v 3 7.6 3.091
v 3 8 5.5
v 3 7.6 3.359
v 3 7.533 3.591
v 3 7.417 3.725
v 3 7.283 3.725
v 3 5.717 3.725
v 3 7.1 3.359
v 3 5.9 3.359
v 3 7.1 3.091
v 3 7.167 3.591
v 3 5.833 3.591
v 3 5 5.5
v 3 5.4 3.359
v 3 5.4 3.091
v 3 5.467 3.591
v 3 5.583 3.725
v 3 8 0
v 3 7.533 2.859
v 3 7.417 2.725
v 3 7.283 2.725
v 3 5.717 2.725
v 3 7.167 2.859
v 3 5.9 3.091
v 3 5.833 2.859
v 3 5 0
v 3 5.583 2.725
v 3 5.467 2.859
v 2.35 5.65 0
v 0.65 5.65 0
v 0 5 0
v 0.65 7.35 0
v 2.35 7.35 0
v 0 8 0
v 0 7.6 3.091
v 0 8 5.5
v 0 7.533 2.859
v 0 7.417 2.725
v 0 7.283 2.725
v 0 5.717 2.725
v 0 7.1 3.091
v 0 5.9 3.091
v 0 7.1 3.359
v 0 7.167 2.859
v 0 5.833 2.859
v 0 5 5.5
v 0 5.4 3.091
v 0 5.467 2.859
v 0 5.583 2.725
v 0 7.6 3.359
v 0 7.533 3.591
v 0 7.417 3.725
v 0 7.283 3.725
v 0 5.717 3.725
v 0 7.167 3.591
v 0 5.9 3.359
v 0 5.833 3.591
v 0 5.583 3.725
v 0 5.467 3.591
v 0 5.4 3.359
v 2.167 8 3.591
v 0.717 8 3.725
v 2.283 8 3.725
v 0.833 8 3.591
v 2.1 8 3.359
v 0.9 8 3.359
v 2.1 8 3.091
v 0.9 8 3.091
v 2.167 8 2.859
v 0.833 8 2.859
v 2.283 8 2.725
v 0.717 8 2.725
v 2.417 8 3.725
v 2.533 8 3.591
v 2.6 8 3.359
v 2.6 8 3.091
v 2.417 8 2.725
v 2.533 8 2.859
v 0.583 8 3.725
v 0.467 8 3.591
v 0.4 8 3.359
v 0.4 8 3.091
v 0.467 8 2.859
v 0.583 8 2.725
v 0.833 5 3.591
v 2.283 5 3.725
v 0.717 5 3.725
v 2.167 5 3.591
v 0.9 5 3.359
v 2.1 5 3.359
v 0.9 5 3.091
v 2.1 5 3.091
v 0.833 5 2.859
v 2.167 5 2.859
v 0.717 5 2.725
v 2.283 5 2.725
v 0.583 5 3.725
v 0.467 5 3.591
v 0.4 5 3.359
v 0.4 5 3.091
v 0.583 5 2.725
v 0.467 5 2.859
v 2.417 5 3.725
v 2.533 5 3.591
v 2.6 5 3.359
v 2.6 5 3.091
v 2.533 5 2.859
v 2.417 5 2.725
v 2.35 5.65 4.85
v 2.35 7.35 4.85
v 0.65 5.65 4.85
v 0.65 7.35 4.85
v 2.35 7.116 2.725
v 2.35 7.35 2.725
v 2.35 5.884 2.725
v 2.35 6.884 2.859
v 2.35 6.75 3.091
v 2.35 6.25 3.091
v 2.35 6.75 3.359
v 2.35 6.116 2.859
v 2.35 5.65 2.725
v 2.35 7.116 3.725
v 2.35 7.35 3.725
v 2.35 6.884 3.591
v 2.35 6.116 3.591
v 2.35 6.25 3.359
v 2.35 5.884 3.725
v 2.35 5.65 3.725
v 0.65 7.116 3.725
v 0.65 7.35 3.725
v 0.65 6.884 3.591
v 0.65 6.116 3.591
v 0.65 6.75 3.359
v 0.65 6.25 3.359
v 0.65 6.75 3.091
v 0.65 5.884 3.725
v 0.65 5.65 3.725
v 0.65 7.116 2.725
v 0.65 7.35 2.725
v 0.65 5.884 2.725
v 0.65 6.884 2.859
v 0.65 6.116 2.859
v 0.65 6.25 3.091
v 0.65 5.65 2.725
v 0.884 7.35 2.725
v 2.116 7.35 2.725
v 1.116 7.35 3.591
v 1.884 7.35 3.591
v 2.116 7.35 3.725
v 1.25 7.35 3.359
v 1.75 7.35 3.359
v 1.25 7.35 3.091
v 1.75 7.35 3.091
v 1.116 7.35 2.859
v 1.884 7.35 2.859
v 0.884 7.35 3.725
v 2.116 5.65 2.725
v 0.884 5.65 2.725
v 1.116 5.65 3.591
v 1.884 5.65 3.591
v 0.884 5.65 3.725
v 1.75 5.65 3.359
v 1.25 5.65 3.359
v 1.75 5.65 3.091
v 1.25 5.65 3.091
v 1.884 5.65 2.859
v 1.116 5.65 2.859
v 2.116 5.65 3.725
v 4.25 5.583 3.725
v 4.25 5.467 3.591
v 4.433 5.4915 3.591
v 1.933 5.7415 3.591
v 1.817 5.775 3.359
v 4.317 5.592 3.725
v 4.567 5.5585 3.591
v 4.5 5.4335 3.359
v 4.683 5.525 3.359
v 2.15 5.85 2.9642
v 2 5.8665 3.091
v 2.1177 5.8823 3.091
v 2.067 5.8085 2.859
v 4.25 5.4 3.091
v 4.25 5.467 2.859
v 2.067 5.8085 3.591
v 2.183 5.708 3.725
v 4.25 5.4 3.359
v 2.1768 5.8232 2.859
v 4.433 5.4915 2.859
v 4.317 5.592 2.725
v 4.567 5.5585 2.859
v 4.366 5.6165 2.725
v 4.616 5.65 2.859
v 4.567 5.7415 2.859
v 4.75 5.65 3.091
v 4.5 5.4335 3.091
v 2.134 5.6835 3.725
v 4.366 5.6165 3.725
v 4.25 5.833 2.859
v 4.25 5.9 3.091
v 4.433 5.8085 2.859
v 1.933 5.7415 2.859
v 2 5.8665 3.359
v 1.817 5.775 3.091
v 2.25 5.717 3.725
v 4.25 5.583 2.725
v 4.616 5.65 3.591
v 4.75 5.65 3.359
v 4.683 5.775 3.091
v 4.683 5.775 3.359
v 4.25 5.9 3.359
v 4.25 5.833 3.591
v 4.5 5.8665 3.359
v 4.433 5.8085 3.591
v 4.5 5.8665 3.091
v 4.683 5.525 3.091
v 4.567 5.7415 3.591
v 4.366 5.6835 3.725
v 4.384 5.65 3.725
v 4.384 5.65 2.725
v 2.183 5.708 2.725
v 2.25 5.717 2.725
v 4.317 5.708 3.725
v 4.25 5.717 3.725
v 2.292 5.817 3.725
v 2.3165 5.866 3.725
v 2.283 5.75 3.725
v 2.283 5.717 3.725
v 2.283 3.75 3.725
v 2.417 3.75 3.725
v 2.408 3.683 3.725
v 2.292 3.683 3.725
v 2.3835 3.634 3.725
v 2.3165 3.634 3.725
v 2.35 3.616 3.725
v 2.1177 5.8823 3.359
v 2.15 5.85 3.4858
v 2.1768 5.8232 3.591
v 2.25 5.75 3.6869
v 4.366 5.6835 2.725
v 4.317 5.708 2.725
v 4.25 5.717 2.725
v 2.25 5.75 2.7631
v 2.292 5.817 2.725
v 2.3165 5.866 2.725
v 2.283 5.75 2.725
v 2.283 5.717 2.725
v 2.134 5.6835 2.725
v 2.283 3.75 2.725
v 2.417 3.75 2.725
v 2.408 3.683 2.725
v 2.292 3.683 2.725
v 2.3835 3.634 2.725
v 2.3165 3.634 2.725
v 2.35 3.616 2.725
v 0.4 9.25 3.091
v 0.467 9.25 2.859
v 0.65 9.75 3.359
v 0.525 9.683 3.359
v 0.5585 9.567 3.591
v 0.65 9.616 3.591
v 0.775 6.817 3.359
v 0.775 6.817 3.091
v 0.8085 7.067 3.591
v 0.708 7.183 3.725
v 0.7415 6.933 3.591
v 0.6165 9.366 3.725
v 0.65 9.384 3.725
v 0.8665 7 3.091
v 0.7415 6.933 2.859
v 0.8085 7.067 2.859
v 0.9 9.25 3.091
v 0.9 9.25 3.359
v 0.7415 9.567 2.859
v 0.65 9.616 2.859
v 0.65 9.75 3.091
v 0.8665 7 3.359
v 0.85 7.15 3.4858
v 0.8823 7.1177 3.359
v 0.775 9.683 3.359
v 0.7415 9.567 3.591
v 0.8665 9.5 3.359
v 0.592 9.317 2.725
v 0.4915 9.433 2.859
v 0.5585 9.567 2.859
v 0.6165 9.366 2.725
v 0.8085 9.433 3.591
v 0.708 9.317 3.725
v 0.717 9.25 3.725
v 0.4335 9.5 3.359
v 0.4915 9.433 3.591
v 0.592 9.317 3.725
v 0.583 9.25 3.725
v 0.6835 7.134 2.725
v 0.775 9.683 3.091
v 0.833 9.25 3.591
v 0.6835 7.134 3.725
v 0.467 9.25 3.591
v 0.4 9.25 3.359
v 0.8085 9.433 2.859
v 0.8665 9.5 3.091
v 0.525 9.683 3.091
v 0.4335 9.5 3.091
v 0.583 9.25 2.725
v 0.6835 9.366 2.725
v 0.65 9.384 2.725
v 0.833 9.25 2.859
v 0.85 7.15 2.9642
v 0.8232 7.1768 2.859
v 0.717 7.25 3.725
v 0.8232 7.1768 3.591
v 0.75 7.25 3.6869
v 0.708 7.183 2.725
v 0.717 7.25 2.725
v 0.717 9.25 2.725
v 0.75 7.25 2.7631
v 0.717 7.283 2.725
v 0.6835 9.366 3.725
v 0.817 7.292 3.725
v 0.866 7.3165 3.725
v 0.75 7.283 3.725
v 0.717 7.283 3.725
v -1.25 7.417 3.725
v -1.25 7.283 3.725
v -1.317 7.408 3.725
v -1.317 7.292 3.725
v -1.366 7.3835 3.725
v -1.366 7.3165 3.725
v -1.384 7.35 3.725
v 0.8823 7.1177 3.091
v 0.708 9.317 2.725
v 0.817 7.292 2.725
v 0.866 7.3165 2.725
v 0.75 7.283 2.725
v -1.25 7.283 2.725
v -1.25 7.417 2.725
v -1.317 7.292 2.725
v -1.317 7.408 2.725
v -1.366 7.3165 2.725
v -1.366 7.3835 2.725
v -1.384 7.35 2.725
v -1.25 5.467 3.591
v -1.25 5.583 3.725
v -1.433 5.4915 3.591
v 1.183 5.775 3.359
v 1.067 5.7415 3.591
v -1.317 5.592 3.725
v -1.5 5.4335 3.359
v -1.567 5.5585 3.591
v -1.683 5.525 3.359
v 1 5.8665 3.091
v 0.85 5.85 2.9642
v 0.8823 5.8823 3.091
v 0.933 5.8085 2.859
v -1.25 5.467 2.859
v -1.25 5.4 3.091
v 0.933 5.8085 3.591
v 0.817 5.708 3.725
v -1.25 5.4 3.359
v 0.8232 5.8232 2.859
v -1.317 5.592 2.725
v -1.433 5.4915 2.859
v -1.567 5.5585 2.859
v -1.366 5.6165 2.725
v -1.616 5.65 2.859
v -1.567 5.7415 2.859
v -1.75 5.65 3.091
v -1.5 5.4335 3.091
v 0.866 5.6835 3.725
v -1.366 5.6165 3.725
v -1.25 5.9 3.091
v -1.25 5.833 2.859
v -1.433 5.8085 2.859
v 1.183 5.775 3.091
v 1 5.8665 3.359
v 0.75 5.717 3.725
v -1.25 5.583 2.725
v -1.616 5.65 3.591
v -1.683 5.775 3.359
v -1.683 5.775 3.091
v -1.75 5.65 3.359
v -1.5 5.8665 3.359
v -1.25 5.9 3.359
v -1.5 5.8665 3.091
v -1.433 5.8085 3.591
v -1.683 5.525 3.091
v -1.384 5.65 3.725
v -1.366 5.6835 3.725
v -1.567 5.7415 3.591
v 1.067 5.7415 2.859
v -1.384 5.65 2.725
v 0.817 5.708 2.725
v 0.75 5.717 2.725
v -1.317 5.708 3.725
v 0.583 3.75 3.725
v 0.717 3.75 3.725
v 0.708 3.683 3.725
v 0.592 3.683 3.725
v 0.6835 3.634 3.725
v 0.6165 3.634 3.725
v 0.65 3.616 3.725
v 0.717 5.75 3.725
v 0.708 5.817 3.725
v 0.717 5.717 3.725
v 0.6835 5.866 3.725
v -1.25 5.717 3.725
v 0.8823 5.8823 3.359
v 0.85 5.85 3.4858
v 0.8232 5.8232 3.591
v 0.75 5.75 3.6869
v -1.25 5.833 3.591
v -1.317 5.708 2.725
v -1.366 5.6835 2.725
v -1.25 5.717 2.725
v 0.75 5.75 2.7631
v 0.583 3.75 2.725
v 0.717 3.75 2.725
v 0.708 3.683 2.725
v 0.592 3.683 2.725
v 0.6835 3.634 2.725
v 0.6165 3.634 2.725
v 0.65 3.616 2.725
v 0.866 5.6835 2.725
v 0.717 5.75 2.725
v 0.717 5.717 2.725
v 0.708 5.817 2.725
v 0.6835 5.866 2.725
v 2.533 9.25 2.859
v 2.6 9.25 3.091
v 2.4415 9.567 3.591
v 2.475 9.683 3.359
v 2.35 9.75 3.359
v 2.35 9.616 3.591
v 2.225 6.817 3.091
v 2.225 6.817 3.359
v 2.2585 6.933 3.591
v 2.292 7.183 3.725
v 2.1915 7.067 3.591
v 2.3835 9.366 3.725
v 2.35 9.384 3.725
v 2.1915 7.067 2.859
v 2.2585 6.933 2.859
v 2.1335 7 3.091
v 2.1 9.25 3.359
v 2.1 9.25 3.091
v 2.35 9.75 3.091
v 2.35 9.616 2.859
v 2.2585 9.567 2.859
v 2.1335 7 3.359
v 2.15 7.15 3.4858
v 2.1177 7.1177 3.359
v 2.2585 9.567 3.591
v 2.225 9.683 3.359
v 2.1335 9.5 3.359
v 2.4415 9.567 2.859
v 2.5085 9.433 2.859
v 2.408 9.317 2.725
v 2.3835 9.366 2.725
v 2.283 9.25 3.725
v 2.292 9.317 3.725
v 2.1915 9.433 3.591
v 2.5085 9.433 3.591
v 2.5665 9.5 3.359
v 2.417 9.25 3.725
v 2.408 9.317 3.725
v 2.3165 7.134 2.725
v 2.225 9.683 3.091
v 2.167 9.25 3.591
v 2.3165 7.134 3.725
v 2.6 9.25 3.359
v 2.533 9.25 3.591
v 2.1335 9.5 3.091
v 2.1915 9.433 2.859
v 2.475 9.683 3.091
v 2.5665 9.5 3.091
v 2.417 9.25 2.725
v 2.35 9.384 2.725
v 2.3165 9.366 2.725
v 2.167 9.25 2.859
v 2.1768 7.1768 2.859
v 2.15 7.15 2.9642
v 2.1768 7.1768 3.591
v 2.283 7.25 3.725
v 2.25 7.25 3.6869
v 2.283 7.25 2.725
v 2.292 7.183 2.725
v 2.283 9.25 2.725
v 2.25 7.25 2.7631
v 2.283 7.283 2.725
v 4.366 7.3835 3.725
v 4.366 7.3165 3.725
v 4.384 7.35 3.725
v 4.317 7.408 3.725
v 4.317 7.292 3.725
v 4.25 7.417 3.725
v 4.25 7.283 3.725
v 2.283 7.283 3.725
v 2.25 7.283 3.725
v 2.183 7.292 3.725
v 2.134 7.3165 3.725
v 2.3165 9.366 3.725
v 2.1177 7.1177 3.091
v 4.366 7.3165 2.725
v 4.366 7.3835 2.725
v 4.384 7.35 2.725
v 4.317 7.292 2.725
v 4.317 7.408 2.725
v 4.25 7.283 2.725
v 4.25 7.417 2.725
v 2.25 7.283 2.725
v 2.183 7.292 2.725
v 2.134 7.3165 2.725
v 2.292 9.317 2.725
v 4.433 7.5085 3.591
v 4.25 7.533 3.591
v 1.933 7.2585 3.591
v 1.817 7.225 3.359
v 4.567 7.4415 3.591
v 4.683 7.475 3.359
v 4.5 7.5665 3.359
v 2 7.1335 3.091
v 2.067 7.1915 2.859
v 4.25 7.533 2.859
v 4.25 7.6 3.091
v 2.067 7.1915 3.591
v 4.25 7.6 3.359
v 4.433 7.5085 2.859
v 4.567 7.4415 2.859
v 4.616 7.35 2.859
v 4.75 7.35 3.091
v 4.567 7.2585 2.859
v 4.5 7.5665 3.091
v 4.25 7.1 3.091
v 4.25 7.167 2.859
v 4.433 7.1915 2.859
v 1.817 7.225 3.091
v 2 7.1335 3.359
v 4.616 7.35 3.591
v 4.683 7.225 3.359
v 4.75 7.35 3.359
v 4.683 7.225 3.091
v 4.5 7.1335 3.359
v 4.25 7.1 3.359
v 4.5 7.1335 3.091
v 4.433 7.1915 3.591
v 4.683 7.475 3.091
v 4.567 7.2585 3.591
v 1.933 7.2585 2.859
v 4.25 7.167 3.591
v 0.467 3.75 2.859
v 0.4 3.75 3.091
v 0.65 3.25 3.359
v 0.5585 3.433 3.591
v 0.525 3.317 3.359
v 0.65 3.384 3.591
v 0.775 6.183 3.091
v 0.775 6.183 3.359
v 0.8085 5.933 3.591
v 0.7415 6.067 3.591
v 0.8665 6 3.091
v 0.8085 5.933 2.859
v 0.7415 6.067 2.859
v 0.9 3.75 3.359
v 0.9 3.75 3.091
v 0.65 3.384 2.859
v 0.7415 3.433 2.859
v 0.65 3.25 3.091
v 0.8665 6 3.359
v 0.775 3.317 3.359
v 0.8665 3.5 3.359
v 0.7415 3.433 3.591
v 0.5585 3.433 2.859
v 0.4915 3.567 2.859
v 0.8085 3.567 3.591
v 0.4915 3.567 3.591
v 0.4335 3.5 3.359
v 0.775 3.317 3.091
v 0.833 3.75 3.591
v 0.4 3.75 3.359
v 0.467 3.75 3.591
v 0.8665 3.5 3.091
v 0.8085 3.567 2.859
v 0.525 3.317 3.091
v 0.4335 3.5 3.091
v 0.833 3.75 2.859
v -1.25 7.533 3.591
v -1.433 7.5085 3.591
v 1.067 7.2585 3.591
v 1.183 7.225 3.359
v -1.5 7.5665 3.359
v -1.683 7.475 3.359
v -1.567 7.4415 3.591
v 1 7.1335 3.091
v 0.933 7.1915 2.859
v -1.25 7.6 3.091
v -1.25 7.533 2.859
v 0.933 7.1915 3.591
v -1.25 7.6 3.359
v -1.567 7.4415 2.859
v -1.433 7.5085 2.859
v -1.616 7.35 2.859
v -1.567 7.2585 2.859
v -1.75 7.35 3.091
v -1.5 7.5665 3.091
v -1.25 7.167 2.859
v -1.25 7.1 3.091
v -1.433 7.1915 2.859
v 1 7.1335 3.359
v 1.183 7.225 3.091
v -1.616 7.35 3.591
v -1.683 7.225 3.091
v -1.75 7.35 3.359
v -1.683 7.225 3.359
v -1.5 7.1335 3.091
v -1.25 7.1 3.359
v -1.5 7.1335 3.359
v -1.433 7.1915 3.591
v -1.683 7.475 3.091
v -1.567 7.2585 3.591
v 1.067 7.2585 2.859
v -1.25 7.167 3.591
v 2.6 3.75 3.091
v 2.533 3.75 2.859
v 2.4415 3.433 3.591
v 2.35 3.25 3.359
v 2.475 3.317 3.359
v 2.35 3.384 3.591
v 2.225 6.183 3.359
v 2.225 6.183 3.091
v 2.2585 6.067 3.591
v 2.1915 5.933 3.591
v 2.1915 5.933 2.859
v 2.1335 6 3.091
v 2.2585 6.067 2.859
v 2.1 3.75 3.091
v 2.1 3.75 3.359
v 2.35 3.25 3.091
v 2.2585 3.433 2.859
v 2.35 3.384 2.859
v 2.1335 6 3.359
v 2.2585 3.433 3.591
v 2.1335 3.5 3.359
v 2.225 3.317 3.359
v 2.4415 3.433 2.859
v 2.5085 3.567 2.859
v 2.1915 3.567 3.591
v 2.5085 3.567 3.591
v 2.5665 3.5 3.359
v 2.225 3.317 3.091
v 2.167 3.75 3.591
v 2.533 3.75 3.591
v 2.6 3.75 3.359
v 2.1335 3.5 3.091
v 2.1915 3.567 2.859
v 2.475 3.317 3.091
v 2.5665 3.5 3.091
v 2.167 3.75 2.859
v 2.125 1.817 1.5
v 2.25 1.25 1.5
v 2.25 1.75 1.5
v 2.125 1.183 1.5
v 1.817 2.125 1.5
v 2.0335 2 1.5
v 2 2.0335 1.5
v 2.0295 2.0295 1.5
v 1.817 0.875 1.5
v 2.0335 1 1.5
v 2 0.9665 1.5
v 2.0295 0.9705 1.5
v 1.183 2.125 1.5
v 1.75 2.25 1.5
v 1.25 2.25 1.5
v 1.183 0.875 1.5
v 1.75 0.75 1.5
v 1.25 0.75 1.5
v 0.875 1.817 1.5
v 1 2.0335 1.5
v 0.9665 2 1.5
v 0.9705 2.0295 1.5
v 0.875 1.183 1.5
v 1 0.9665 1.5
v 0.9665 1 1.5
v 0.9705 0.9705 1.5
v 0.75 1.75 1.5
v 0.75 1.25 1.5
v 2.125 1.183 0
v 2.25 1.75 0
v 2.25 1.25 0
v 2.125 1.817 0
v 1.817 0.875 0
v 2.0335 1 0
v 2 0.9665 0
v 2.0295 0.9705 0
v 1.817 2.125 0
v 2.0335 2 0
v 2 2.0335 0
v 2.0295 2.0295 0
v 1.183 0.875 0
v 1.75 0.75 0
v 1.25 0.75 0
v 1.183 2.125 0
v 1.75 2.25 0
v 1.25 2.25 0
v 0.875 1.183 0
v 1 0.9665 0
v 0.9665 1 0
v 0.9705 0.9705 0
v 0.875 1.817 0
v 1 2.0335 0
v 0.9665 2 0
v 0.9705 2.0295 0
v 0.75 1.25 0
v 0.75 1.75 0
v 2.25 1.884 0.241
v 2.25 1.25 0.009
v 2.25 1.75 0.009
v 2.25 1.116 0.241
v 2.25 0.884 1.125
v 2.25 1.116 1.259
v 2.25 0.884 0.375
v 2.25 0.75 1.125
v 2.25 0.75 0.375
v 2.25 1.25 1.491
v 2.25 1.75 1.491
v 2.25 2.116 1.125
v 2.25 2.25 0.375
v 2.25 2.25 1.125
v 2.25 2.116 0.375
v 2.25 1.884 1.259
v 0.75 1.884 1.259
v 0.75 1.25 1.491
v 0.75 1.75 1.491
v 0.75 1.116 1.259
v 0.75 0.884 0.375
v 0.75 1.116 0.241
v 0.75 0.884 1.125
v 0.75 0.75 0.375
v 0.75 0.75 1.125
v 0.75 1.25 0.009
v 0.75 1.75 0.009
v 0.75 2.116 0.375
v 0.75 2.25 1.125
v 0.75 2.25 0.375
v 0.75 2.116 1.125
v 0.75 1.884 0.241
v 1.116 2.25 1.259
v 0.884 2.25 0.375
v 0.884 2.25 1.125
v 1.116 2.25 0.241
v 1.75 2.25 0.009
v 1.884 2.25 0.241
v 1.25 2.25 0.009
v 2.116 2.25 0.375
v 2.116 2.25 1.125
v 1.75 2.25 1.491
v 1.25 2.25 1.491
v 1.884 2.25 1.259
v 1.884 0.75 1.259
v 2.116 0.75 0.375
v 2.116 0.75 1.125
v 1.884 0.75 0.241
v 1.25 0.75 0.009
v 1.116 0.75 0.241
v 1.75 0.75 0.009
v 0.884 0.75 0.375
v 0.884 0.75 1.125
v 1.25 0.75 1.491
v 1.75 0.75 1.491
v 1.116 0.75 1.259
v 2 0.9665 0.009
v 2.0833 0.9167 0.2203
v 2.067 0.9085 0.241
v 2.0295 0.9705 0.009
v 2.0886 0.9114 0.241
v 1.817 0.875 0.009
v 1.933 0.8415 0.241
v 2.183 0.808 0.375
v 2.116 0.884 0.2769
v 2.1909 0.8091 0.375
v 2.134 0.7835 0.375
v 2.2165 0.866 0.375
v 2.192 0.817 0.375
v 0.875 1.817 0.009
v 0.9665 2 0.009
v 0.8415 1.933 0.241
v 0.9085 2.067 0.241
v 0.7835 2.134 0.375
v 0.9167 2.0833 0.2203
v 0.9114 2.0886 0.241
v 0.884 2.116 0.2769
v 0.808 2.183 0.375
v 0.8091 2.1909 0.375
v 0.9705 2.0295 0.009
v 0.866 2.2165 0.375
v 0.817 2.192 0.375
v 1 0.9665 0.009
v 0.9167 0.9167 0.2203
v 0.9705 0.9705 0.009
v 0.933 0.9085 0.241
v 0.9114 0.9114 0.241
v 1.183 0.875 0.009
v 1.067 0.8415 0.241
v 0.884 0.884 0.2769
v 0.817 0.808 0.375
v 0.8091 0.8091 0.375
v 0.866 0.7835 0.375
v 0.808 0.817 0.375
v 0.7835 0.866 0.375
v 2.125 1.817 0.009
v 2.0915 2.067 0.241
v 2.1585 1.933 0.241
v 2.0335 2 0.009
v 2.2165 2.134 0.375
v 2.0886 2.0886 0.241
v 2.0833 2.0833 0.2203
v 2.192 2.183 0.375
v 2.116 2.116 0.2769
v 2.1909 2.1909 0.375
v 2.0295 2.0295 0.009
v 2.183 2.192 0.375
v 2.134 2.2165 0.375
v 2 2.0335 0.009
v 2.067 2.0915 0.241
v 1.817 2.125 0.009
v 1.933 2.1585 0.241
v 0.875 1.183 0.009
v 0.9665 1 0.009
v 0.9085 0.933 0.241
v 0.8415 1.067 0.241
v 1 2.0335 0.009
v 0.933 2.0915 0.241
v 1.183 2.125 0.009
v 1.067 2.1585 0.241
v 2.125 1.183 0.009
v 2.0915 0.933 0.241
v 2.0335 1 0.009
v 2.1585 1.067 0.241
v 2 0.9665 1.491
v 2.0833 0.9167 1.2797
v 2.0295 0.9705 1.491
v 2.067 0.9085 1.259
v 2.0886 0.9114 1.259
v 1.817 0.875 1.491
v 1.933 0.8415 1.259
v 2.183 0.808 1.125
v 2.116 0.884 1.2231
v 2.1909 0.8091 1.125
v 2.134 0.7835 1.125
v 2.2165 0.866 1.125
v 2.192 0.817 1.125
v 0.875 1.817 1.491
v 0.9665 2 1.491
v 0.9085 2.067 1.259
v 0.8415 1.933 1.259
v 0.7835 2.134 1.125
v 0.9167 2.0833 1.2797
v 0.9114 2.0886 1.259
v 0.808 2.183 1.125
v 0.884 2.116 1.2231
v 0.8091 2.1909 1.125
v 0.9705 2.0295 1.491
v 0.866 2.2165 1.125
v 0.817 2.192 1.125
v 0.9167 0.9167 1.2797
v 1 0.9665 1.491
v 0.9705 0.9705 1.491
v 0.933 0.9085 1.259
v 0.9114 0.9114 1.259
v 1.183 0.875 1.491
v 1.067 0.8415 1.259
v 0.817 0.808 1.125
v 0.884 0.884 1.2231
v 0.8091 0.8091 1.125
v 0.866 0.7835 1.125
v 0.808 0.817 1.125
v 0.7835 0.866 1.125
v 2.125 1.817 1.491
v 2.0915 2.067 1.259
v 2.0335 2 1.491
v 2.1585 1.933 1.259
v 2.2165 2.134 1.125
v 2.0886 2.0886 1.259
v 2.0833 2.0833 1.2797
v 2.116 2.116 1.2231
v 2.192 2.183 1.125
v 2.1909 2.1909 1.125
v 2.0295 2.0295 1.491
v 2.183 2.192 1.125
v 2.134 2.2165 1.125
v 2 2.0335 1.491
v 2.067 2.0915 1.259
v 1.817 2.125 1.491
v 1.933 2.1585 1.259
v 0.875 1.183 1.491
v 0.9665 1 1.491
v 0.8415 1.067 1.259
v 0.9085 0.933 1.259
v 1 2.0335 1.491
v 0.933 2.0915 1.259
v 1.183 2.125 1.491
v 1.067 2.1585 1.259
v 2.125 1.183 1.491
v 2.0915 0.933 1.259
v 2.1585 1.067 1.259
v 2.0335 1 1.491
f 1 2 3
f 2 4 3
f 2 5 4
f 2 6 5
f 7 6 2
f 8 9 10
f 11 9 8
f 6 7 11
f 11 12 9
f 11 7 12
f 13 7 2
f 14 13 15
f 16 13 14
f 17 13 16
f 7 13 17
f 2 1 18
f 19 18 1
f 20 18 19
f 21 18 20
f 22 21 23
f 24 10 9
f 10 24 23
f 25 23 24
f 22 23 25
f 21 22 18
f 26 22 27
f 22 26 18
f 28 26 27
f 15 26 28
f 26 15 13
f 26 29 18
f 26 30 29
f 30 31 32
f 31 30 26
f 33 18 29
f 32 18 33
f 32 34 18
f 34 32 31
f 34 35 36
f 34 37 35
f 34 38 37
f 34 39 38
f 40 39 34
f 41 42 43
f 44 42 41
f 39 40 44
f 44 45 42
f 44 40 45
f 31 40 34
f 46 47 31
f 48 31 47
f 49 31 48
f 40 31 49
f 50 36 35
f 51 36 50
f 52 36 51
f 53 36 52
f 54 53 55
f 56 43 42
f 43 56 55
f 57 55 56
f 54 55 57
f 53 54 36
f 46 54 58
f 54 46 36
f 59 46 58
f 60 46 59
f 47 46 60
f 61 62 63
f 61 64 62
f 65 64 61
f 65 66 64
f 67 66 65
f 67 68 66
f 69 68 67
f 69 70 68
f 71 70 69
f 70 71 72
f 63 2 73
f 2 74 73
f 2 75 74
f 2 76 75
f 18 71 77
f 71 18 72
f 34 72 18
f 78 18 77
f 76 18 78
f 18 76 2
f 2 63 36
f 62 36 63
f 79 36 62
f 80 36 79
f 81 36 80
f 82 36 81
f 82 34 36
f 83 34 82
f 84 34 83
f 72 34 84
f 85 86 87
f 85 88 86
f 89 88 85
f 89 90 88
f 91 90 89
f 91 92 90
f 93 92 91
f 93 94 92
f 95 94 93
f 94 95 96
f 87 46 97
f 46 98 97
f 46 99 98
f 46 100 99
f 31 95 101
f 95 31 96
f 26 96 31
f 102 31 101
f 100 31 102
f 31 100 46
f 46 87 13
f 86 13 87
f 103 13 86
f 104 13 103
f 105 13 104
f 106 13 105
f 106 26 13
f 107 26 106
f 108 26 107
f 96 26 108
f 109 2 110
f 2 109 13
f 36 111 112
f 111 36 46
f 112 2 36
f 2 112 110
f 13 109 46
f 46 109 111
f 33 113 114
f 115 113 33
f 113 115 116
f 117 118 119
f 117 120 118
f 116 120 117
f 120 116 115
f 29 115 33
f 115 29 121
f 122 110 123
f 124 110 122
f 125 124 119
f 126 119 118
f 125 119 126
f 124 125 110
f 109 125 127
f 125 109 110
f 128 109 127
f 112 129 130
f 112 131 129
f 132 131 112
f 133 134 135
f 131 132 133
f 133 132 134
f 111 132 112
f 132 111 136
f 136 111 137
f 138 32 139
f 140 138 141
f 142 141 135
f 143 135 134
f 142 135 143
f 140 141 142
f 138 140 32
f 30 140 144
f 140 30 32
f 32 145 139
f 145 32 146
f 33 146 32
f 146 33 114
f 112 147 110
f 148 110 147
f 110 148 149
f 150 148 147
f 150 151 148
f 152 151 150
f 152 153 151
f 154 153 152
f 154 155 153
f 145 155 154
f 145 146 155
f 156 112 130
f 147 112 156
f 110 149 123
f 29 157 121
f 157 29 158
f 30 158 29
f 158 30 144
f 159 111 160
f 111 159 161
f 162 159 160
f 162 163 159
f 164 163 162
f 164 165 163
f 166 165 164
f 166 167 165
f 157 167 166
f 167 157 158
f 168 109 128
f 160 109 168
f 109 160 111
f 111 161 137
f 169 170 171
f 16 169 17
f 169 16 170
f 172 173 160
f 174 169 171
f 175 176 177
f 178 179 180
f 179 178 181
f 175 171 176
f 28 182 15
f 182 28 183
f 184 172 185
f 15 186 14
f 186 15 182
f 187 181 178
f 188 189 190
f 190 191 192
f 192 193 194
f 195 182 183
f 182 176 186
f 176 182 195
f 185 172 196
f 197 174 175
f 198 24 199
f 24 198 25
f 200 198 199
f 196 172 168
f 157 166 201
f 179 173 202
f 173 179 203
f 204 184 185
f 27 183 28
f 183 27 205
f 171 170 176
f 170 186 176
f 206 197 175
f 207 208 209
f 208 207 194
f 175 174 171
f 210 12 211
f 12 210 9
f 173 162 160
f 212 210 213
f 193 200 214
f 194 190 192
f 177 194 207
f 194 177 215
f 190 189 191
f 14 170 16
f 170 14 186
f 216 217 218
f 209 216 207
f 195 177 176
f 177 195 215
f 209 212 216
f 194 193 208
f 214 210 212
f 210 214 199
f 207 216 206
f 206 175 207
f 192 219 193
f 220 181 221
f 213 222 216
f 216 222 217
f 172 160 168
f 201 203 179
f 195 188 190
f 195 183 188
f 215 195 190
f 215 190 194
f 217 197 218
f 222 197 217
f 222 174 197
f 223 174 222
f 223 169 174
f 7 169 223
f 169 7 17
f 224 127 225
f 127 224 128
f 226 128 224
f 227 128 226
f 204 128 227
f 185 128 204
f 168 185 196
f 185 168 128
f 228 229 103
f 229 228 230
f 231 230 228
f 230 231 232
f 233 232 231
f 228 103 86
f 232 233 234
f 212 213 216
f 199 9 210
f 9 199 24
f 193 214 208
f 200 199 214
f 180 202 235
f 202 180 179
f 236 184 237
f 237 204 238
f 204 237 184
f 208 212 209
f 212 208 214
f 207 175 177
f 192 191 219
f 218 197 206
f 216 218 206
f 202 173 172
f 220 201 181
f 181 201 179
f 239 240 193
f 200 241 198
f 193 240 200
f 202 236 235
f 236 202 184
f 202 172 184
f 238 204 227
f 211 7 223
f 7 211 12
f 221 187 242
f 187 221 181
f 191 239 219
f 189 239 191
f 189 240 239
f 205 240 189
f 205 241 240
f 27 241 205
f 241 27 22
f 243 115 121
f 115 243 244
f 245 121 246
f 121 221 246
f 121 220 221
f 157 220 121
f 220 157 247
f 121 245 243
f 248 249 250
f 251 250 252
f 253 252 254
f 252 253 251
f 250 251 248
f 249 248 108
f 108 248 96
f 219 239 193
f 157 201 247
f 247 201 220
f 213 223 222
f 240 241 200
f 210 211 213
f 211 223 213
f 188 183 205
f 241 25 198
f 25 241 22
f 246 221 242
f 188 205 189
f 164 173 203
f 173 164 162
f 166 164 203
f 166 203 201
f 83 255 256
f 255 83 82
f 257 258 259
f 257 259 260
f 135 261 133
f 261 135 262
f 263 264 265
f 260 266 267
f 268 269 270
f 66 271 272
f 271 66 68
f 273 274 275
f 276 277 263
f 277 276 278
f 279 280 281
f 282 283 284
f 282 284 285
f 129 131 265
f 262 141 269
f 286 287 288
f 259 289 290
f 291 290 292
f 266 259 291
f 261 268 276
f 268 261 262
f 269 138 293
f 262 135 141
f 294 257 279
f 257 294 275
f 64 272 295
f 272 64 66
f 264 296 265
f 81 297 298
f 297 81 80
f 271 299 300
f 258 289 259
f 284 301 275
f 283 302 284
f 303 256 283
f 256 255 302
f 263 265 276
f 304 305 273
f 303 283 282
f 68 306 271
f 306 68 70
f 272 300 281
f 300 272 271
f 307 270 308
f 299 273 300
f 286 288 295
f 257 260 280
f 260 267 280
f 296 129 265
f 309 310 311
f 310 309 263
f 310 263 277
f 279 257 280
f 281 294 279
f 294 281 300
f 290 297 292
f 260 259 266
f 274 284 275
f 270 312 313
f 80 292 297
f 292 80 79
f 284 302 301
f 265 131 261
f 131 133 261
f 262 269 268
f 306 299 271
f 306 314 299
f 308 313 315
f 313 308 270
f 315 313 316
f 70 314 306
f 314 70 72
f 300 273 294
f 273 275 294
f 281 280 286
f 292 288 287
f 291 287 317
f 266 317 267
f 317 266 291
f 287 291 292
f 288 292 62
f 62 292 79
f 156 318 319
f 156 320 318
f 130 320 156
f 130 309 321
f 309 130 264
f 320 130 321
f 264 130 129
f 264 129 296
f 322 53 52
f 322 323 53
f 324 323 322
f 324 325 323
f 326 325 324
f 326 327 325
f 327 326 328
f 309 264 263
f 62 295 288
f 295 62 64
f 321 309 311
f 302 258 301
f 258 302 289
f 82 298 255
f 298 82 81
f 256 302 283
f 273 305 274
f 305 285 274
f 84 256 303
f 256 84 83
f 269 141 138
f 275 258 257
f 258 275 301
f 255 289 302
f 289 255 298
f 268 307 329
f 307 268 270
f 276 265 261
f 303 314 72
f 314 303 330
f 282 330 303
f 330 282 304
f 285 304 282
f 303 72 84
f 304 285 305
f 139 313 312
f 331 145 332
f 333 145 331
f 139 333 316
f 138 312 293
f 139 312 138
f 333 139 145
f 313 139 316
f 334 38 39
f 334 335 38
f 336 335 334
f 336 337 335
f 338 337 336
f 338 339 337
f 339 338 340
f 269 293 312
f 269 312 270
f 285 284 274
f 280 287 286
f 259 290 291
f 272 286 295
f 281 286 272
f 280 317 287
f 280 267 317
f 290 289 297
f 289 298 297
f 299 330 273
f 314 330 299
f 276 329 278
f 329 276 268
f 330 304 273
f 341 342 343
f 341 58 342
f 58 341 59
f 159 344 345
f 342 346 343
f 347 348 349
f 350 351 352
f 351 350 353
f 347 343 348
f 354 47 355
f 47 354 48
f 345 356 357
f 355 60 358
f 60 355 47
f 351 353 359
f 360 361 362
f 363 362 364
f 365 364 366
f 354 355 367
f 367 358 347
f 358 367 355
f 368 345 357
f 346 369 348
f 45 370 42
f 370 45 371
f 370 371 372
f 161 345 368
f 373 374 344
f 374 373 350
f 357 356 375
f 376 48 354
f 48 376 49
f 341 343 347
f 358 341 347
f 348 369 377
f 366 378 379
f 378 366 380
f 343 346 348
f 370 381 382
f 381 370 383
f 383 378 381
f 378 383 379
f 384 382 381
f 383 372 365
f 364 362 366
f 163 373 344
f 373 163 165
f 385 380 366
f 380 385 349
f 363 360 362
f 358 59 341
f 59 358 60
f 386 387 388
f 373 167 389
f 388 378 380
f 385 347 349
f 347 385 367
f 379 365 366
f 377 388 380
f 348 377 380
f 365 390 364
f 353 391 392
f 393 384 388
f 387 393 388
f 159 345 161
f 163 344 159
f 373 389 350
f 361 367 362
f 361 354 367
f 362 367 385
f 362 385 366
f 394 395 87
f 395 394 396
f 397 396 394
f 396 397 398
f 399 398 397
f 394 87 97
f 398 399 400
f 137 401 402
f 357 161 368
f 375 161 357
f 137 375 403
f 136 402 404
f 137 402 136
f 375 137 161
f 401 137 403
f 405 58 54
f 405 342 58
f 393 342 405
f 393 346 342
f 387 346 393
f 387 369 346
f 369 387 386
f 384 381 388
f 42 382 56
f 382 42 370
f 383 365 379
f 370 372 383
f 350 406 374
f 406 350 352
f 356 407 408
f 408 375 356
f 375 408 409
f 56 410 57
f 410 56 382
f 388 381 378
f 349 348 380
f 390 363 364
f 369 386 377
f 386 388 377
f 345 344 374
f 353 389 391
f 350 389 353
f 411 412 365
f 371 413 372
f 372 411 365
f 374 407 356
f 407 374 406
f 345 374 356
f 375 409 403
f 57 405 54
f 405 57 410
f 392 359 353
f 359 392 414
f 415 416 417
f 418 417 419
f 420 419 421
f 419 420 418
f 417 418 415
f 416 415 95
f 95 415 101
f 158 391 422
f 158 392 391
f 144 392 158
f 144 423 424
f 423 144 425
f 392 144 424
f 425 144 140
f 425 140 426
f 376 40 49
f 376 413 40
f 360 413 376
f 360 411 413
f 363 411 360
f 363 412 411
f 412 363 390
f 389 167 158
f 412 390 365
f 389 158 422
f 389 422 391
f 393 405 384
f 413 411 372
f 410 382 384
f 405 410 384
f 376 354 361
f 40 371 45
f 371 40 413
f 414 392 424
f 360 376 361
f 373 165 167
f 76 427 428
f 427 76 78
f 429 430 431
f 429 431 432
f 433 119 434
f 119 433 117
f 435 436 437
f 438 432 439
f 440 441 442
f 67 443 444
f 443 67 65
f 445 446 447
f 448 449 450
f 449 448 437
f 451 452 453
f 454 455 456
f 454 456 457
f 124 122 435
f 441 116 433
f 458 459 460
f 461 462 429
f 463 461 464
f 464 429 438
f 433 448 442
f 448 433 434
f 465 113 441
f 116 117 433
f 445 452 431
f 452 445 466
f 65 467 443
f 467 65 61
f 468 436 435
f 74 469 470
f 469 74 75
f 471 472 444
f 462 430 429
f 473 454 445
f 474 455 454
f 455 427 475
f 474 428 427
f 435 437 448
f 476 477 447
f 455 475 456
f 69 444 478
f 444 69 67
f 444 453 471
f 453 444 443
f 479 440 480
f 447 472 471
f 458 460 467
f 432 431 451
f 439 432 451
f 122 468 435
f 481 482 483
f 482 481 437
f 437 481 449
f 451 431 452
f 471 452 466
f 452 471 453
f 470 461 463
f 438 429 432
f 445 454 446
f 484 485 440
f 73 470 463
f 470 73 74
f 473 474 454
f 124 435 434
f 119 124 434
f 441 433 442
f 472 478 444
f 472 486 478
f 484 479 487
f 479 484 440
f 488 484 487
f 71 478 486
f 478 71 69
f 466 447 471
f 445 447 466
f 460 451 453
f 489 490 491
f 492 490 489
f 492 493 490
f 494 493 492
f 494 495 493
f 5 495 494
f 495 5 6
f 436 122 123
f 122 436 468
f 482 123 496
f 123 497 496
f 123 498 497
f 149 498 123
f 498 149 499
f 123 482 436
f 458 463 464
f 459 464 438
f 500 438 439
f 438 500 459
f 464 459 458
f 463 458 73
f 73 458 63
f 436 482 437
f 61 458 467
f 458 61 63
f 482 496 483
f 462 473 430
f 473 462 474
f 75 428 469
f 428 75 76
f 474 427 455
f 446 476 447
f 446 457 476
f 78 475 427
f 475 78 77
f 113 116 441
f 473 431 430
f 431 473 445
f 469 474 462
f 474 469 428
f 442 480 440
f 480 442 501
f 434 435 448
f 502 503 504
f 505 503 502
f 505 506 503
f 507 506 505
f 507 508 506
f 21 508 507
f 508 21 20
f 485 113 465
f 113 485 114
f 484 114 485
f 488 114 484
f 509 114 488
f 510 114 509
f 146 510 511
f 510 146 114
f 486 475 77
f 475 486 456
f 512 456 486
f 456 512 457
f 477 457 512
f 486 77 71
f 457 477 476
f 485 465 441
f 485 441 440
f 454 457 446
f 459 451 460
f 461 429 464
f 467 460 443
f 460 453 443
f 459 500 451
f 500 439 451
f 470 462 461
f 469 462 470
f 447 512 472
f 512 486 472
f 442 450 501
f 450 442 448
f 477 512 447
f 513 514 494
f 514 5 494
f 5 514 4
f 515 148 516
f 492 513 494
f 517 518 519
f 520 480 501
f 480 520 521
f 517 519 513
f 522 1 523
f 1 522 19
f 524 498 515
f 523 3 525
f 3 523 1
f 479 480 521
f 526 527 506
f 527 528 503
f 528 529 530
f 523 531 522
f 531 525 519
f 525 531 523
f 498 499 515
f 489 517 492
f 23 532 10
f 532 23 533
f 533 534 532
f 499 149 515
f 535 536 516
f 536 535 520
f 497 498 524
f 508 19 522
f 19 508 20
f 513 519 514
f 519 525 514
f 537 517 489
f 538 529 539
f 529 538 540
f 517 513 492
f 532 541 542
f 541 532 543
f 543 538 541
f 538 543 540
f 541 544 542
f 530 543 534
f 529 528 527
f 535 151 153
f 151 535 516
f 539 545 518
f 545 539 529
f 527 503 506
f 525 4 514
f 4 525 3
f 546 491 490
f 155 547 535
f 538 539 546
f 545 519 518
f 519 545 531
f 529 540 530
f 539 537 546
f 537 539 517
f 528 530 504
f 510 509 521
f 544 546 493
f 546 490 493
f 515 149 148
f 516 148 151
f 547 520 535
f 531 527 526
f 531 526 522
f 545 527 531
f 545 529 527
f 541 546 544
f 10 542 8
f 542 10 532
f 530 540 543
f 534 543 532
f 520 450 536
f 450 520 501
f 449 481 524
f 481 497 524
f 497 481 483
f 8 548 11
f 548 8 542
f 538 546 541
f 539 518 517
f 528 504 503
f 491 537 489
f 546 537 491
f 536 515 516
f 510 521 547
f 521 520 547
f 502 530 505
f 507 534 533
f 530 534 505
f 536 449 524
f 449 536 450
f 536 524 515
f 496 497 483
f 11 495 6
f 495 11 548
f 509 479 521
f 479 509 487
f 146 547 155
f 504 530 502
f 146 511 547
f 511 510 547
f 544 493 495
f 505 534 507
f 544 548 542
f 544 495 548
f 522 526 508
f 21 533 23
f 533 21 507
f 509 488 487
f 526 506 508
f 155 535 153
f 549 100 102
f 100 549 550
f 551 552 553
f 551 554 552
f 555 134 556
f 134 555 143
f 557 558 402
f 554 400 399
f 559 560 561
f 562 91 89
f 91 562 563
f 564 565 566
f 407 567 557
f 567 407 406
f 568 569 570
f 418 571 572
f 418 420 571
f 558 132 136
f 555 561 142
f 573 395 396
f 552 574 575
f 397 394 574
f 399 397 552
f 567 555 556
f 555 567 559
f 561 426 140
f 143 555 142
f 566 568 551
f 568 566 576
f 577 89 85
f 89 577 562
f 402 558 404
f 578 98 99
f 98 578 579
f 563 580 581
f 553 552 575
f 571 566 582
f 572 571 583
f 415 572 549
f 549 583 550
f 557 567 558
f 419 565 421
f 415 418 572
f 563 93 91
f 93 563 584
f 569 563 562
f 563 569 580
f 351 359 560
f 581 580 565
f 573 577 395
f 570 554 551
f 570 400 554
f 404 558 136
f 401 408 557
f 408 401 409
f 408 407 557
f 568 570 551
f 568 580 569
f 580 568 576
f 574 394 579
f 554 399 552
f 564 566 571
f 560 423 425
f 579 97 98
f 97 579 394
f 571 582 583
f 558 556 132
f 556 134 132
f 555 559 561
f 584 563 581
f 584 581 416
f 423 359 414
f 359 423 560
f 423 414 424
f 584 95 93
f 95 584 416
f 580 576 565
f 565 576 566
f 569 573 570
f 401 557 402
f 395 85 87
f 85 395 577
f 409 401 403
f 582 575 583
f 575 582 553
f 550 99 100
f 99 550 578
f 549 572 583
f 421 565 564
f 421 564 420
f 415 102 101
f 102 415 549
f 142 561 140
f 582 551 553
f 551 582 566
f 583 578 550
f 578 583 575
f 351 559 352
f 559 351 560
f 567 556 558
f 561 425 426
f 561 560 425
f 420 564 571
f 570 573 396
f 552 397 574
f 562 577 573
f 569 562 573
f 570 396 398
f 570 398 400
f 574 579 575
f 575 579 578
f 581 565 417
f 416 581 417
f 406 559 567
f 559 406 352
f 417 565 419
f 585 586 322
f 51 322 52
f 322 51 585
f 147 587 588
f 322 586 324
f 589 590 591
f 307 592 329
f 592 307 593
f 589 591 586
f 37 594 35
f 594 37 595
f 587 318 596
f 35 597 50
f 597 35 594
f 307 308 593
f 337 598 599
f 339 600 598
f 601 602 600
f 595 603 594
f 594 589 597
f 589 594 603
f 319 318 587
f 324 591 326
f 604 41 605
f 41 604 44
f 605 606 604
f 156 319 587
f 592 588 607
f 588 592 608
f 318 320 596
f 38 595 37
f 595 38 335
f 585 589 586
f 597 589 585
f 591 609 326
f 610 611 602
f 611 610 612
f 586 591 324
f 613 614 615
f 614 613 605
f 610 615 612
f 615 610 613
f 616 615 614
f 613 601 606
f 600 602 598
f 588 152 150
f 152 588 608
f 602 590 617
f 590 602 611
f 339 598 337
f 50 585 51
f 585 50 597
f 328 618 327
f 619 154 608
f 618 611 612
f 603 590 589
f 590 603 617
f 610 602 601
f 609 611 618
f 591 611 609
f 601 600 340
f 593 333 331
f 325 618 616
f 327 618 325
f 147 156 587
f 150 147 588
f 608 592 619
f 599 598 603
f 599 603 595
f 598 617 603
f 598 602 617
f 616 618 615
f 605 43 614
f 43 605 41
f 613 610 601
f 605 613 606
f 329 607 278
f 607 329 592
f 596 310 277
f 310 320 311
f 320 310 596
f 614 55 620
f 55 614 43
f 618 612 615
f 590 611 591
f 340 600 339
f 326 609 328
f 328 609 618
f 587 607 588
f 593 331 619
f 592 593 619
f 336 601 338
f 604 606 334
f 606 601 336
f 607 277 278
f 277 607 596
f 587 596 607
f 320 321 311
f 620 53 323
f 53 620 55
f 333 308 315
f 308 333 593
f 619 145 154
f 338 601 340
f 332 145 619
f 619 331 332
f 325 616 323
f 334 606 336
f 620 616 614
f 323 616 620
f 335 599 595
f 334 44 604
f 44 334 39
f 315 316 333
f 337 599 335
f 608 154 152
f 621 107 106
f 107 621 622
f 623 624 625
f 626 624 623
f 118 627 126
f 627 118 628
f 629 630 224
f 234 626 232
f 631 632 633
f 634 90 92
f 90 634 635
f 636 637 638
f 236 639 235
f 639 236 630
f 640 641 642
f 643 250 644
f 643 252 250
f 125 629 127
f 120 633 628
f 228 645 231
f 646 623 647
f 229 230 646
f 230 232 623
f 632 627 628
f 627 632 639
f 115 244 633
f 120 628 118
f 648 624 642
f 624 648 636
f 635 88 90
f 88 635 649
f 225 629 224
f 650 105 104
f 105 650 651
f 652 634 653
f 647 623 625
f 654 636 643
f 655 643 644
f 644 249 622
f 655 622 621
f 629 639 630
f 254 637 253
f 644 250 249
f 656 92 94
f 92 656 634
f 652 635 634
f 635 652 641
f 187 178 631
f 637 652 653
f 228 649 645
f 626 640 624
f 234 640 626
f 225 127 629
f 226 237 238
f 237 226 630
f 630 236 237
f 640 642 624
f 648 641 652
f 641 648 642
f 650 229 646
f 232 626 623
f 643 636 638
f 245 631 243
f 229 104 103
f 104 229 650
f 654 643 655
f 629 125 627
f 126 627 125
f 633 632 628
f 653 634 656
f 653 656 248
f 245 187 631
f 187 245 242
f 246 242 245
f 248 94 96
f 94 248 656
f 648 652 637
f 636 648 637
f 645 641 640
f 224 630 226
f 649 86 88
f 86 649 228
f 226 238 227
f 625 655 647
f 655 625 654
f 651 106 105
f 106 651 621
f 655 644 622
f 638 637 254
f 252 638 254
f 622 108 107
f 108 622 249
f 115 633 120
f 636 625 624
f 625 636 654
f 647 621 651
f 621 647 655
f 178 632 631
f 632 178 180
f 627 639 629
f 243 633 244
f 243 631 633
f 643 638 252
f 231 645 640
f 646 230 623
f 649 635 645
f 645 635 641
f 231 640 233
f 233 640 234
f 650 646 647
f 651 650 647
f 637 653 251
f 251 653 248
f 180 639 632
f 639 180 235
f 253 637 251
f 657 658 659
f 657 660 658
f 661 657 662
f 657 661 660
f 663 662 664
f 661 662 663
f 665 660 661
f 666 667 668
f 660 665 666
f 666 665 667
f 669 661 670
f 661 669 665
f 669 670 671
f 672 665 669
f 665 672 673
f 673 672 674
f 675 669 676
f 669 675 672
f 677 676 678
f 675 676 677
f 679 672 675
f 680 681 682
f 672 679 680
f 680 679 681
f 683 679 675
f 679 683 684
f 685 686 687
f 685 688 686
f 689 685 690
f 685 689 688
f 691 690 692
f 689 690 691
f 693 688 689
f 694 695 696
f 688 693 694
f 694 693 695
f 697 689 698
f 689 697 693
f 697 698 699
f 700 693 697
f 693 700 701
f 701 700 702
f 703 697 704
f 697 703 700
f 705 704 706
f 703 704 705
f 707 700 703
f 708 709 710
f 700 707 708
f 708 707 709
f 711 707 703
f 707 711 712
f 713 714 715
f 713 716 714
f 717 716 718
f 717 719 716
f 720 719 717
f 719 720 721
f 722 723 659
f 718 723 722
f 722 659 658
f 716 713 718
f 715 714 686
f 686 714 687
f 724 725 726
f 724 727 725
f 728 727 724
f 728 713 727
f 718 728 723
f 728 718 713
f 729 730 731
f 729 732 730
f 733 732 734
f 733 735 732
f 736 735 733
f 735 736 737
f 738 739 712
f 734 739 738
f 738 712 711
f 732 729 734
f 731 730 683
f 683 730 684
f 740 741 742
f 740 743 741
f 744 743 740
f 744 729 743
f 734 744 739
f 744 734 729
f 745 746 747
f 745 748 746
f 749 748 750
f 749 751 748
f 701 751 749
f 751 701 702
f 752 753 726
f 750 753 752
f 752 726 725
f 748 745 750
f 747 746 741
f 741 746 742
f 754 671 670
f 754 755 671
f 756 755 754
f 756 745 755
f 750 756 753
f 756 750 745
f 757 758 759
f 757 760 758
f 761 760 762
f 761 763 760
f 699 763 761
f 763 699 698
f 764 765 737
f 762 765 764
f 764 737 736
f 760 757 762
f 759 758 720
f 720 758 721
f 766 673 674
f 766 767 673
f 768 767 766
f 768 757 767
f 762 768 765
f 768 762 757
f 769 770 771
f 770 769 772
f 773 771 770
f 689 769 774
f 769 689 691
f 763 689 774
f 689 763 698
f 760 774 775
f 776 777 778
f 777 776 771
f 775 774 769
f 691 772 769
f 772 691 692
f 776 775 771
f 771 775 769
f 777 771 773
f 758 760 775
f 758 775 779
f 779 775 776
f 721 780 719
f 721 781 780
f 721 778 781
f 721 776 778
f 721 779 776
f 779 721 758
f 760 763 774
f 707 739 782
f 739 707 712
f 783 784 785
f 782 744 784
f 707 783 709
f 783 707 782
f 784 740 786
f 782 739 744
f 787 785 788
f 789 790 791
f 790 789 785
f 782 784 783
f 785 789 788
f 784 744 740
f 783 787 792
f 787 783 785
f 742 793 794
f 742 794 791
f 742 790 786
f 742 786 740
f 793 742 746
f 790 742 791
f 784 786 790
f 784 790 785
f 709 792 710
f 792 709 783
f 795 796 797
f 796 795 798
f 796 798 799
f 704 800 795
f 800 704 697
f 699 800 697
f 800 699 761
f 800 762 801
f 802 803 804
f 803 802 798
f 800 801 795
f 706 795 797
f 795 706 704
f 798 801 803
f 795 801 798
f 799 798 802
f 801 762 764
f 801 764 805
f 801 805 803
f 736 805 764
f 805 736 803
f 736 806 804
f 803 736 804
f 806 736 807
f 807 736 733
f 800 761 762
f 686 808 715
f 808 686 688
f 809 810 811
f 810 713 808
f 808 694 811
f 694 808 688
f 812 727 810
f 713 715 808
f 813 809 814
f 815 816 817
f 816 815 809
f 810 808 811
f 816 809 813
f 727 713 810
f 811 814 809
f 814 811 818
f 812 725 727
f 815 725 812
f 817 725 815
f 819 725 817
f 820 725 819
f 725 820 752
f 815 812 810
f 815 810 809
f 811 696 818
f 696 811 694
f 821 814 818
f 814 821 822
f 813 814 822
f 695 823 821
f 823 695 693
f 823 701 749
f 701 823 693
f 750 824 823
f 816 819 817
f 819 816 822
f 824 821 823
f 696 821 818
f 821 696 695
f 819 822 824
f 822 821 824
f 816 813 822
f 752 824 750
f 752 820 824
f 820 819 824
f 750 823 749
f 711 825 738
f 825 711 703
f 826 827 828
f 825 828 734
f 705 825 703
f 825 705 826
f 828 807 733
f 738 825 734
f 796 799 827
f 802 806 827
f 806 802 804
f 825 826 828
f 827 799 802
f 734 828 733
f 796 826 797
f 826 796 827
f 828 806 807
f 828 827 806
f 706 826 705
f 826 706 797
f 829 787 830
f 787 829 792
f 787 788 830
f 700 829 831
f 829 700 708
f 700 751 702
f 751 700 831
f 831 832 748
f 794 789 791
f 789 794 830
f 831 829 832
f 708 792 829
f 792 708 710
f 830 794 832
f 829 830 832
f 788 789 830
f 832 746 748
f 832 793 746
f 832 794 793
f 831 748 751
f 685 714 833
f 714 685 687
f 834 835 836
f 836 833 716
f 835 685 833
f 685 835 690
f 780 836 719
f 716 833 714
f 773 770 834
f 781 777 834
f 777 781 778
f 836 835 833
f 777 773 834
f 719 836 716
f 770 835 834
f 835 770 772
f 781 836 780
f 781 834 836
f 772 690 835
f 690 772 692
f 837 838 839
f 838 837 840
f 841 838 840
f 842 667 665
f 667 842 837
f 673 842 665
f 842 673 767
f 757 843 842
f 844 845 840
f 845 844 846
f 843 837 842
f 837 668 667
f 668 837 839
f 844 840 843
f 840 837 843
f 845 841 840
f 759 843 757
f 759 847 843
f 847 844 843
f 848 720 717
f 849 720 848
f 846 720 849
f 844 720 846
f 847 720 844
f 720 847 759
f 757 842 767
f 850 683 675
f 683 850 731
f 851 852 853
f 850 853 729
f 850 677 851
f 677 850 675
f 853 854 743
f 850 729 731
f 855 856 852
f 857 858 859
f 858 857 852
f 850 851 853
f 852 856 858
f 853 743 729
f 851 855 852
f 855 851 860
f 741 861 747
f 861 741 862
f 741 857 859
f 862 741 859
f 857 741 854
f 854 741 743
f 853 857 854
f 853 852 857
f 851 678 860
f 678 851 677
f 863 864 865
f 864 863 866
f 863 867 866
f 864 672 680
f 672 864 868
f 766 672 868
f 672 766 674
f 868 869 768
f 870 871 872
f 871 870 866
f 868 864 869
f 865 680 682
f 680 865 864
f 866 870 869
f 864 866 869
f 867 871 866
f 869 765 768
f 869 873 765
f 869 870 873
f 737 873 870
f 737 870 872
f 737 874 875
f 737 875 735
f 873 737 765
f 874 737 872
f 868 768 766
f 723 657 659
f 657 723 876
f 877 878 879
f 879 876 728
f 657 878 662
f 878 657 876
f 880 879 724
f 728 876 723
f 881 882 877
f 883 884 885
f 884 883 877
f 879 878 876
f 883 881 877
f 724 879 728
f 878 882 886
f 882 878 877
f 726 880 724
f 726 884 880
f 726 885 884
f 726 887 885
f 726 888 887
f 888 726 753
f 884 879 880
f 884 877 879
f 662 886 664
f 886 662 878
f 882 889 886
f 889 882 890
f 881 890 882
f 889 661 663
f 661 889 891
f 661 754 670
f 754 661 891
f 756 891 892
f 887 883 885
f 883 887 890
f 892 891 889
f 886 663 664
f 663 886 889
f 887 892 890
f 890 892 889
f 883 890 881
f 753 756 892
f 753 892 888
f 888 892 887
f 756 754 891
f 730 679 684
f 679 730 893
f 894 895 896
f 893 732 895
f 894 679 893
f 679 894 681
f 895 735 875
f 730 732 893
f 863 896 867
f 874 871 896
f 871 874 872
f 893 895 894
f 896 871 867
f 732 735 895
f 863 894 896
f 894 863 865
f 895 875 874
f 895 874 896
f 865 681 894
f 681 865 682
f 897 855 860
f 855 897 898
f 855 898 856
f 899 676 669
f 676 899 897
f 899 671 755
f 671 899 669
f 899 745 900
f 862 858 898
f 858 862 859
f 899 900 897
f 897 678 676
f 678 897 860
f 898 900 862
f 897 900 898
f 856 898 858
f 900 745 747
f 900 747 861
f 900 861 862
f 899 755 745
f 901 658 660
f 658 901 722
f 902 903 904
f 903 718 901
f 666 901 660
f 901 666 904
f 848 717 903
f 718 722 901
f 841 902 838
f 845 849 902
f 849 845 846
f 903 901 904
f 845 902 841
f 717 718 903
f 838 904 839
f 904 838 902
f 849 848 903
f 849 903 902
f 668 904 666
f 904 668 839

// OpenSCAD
// BGSD
include <../lib/boardgame_insert_toolkit_lib.4.scad>;
data = [
    // Source STL: Tokens B.stl
    // STL bbox min [-66, -36, 0] max [-14, 119, 28] size [52, 155, 28]
    // Detected compartments: 4; wall thickness: 1.5mm
    [ OBJECT_BOX,
        [ NAME, "Tokens B" ],
        [ BOX_SIZE_XYZ, [52, 155, 28] ],
        [ BOX_WALL_THICKNESS, 1.5 ],
        [ BOX_NO_LID_B, true ],
        [ BOX_FEATURE,
            [ NAME, "Tokens B cavity 1" ],
            [ FTR_COMPARTMENT_SIZE_XYZ, [49, 48, 26.5] ],
            [ FTR_NUM_COMPARTMENTS_XY, [1, 1] ],
            [ FTR_SHAPE, SQUARE ],
            [ POSITION_XY, [0, 0] ],
        ],
        [ BOX_FEATURE,
            [ NAME, "Tokens B cavity 2" ],
            [ FTR_COMPARTMENT_SIZE_XYZ, [49, 48, 26.5] ],
            [ FTR_NUM_COMPARTMENTS_XY, [1, 1] ],
            [ FTR_SHAPE, SQUARE ],
            [ POSITION_XY, [0, 49.5] ],
        ],
        [ BOX_FEATURE,
            [ NAME, "Tokens B cavity 3" ],
            [ FTR_COMPARTMENT_SIZE_XYZ, [49, 42, 26.5] ],
            [ FTR_NUM_COMPARTMENTS_XY, [1, 1] ],
            [ FTR_SHAPE, SQUARE ],
            [ POSITION_XY, [0, 99] ],
        ],
        [ BOX_FEATURE,
            [ NAME, "Tokens B cavity 4" ],
            [ FTR_COMPARTMENT_SIZE_XYZ, [49, 9.5, 26.5] ],
            [ FTR_NUM_COMPARTMENTS_XY, [1, 1] ],
            [ FTR_SHAPE, SQUARE ],
            [ POSITION_XY, [0, 142.5] ],
        ],
    ],
];
Make(data);
